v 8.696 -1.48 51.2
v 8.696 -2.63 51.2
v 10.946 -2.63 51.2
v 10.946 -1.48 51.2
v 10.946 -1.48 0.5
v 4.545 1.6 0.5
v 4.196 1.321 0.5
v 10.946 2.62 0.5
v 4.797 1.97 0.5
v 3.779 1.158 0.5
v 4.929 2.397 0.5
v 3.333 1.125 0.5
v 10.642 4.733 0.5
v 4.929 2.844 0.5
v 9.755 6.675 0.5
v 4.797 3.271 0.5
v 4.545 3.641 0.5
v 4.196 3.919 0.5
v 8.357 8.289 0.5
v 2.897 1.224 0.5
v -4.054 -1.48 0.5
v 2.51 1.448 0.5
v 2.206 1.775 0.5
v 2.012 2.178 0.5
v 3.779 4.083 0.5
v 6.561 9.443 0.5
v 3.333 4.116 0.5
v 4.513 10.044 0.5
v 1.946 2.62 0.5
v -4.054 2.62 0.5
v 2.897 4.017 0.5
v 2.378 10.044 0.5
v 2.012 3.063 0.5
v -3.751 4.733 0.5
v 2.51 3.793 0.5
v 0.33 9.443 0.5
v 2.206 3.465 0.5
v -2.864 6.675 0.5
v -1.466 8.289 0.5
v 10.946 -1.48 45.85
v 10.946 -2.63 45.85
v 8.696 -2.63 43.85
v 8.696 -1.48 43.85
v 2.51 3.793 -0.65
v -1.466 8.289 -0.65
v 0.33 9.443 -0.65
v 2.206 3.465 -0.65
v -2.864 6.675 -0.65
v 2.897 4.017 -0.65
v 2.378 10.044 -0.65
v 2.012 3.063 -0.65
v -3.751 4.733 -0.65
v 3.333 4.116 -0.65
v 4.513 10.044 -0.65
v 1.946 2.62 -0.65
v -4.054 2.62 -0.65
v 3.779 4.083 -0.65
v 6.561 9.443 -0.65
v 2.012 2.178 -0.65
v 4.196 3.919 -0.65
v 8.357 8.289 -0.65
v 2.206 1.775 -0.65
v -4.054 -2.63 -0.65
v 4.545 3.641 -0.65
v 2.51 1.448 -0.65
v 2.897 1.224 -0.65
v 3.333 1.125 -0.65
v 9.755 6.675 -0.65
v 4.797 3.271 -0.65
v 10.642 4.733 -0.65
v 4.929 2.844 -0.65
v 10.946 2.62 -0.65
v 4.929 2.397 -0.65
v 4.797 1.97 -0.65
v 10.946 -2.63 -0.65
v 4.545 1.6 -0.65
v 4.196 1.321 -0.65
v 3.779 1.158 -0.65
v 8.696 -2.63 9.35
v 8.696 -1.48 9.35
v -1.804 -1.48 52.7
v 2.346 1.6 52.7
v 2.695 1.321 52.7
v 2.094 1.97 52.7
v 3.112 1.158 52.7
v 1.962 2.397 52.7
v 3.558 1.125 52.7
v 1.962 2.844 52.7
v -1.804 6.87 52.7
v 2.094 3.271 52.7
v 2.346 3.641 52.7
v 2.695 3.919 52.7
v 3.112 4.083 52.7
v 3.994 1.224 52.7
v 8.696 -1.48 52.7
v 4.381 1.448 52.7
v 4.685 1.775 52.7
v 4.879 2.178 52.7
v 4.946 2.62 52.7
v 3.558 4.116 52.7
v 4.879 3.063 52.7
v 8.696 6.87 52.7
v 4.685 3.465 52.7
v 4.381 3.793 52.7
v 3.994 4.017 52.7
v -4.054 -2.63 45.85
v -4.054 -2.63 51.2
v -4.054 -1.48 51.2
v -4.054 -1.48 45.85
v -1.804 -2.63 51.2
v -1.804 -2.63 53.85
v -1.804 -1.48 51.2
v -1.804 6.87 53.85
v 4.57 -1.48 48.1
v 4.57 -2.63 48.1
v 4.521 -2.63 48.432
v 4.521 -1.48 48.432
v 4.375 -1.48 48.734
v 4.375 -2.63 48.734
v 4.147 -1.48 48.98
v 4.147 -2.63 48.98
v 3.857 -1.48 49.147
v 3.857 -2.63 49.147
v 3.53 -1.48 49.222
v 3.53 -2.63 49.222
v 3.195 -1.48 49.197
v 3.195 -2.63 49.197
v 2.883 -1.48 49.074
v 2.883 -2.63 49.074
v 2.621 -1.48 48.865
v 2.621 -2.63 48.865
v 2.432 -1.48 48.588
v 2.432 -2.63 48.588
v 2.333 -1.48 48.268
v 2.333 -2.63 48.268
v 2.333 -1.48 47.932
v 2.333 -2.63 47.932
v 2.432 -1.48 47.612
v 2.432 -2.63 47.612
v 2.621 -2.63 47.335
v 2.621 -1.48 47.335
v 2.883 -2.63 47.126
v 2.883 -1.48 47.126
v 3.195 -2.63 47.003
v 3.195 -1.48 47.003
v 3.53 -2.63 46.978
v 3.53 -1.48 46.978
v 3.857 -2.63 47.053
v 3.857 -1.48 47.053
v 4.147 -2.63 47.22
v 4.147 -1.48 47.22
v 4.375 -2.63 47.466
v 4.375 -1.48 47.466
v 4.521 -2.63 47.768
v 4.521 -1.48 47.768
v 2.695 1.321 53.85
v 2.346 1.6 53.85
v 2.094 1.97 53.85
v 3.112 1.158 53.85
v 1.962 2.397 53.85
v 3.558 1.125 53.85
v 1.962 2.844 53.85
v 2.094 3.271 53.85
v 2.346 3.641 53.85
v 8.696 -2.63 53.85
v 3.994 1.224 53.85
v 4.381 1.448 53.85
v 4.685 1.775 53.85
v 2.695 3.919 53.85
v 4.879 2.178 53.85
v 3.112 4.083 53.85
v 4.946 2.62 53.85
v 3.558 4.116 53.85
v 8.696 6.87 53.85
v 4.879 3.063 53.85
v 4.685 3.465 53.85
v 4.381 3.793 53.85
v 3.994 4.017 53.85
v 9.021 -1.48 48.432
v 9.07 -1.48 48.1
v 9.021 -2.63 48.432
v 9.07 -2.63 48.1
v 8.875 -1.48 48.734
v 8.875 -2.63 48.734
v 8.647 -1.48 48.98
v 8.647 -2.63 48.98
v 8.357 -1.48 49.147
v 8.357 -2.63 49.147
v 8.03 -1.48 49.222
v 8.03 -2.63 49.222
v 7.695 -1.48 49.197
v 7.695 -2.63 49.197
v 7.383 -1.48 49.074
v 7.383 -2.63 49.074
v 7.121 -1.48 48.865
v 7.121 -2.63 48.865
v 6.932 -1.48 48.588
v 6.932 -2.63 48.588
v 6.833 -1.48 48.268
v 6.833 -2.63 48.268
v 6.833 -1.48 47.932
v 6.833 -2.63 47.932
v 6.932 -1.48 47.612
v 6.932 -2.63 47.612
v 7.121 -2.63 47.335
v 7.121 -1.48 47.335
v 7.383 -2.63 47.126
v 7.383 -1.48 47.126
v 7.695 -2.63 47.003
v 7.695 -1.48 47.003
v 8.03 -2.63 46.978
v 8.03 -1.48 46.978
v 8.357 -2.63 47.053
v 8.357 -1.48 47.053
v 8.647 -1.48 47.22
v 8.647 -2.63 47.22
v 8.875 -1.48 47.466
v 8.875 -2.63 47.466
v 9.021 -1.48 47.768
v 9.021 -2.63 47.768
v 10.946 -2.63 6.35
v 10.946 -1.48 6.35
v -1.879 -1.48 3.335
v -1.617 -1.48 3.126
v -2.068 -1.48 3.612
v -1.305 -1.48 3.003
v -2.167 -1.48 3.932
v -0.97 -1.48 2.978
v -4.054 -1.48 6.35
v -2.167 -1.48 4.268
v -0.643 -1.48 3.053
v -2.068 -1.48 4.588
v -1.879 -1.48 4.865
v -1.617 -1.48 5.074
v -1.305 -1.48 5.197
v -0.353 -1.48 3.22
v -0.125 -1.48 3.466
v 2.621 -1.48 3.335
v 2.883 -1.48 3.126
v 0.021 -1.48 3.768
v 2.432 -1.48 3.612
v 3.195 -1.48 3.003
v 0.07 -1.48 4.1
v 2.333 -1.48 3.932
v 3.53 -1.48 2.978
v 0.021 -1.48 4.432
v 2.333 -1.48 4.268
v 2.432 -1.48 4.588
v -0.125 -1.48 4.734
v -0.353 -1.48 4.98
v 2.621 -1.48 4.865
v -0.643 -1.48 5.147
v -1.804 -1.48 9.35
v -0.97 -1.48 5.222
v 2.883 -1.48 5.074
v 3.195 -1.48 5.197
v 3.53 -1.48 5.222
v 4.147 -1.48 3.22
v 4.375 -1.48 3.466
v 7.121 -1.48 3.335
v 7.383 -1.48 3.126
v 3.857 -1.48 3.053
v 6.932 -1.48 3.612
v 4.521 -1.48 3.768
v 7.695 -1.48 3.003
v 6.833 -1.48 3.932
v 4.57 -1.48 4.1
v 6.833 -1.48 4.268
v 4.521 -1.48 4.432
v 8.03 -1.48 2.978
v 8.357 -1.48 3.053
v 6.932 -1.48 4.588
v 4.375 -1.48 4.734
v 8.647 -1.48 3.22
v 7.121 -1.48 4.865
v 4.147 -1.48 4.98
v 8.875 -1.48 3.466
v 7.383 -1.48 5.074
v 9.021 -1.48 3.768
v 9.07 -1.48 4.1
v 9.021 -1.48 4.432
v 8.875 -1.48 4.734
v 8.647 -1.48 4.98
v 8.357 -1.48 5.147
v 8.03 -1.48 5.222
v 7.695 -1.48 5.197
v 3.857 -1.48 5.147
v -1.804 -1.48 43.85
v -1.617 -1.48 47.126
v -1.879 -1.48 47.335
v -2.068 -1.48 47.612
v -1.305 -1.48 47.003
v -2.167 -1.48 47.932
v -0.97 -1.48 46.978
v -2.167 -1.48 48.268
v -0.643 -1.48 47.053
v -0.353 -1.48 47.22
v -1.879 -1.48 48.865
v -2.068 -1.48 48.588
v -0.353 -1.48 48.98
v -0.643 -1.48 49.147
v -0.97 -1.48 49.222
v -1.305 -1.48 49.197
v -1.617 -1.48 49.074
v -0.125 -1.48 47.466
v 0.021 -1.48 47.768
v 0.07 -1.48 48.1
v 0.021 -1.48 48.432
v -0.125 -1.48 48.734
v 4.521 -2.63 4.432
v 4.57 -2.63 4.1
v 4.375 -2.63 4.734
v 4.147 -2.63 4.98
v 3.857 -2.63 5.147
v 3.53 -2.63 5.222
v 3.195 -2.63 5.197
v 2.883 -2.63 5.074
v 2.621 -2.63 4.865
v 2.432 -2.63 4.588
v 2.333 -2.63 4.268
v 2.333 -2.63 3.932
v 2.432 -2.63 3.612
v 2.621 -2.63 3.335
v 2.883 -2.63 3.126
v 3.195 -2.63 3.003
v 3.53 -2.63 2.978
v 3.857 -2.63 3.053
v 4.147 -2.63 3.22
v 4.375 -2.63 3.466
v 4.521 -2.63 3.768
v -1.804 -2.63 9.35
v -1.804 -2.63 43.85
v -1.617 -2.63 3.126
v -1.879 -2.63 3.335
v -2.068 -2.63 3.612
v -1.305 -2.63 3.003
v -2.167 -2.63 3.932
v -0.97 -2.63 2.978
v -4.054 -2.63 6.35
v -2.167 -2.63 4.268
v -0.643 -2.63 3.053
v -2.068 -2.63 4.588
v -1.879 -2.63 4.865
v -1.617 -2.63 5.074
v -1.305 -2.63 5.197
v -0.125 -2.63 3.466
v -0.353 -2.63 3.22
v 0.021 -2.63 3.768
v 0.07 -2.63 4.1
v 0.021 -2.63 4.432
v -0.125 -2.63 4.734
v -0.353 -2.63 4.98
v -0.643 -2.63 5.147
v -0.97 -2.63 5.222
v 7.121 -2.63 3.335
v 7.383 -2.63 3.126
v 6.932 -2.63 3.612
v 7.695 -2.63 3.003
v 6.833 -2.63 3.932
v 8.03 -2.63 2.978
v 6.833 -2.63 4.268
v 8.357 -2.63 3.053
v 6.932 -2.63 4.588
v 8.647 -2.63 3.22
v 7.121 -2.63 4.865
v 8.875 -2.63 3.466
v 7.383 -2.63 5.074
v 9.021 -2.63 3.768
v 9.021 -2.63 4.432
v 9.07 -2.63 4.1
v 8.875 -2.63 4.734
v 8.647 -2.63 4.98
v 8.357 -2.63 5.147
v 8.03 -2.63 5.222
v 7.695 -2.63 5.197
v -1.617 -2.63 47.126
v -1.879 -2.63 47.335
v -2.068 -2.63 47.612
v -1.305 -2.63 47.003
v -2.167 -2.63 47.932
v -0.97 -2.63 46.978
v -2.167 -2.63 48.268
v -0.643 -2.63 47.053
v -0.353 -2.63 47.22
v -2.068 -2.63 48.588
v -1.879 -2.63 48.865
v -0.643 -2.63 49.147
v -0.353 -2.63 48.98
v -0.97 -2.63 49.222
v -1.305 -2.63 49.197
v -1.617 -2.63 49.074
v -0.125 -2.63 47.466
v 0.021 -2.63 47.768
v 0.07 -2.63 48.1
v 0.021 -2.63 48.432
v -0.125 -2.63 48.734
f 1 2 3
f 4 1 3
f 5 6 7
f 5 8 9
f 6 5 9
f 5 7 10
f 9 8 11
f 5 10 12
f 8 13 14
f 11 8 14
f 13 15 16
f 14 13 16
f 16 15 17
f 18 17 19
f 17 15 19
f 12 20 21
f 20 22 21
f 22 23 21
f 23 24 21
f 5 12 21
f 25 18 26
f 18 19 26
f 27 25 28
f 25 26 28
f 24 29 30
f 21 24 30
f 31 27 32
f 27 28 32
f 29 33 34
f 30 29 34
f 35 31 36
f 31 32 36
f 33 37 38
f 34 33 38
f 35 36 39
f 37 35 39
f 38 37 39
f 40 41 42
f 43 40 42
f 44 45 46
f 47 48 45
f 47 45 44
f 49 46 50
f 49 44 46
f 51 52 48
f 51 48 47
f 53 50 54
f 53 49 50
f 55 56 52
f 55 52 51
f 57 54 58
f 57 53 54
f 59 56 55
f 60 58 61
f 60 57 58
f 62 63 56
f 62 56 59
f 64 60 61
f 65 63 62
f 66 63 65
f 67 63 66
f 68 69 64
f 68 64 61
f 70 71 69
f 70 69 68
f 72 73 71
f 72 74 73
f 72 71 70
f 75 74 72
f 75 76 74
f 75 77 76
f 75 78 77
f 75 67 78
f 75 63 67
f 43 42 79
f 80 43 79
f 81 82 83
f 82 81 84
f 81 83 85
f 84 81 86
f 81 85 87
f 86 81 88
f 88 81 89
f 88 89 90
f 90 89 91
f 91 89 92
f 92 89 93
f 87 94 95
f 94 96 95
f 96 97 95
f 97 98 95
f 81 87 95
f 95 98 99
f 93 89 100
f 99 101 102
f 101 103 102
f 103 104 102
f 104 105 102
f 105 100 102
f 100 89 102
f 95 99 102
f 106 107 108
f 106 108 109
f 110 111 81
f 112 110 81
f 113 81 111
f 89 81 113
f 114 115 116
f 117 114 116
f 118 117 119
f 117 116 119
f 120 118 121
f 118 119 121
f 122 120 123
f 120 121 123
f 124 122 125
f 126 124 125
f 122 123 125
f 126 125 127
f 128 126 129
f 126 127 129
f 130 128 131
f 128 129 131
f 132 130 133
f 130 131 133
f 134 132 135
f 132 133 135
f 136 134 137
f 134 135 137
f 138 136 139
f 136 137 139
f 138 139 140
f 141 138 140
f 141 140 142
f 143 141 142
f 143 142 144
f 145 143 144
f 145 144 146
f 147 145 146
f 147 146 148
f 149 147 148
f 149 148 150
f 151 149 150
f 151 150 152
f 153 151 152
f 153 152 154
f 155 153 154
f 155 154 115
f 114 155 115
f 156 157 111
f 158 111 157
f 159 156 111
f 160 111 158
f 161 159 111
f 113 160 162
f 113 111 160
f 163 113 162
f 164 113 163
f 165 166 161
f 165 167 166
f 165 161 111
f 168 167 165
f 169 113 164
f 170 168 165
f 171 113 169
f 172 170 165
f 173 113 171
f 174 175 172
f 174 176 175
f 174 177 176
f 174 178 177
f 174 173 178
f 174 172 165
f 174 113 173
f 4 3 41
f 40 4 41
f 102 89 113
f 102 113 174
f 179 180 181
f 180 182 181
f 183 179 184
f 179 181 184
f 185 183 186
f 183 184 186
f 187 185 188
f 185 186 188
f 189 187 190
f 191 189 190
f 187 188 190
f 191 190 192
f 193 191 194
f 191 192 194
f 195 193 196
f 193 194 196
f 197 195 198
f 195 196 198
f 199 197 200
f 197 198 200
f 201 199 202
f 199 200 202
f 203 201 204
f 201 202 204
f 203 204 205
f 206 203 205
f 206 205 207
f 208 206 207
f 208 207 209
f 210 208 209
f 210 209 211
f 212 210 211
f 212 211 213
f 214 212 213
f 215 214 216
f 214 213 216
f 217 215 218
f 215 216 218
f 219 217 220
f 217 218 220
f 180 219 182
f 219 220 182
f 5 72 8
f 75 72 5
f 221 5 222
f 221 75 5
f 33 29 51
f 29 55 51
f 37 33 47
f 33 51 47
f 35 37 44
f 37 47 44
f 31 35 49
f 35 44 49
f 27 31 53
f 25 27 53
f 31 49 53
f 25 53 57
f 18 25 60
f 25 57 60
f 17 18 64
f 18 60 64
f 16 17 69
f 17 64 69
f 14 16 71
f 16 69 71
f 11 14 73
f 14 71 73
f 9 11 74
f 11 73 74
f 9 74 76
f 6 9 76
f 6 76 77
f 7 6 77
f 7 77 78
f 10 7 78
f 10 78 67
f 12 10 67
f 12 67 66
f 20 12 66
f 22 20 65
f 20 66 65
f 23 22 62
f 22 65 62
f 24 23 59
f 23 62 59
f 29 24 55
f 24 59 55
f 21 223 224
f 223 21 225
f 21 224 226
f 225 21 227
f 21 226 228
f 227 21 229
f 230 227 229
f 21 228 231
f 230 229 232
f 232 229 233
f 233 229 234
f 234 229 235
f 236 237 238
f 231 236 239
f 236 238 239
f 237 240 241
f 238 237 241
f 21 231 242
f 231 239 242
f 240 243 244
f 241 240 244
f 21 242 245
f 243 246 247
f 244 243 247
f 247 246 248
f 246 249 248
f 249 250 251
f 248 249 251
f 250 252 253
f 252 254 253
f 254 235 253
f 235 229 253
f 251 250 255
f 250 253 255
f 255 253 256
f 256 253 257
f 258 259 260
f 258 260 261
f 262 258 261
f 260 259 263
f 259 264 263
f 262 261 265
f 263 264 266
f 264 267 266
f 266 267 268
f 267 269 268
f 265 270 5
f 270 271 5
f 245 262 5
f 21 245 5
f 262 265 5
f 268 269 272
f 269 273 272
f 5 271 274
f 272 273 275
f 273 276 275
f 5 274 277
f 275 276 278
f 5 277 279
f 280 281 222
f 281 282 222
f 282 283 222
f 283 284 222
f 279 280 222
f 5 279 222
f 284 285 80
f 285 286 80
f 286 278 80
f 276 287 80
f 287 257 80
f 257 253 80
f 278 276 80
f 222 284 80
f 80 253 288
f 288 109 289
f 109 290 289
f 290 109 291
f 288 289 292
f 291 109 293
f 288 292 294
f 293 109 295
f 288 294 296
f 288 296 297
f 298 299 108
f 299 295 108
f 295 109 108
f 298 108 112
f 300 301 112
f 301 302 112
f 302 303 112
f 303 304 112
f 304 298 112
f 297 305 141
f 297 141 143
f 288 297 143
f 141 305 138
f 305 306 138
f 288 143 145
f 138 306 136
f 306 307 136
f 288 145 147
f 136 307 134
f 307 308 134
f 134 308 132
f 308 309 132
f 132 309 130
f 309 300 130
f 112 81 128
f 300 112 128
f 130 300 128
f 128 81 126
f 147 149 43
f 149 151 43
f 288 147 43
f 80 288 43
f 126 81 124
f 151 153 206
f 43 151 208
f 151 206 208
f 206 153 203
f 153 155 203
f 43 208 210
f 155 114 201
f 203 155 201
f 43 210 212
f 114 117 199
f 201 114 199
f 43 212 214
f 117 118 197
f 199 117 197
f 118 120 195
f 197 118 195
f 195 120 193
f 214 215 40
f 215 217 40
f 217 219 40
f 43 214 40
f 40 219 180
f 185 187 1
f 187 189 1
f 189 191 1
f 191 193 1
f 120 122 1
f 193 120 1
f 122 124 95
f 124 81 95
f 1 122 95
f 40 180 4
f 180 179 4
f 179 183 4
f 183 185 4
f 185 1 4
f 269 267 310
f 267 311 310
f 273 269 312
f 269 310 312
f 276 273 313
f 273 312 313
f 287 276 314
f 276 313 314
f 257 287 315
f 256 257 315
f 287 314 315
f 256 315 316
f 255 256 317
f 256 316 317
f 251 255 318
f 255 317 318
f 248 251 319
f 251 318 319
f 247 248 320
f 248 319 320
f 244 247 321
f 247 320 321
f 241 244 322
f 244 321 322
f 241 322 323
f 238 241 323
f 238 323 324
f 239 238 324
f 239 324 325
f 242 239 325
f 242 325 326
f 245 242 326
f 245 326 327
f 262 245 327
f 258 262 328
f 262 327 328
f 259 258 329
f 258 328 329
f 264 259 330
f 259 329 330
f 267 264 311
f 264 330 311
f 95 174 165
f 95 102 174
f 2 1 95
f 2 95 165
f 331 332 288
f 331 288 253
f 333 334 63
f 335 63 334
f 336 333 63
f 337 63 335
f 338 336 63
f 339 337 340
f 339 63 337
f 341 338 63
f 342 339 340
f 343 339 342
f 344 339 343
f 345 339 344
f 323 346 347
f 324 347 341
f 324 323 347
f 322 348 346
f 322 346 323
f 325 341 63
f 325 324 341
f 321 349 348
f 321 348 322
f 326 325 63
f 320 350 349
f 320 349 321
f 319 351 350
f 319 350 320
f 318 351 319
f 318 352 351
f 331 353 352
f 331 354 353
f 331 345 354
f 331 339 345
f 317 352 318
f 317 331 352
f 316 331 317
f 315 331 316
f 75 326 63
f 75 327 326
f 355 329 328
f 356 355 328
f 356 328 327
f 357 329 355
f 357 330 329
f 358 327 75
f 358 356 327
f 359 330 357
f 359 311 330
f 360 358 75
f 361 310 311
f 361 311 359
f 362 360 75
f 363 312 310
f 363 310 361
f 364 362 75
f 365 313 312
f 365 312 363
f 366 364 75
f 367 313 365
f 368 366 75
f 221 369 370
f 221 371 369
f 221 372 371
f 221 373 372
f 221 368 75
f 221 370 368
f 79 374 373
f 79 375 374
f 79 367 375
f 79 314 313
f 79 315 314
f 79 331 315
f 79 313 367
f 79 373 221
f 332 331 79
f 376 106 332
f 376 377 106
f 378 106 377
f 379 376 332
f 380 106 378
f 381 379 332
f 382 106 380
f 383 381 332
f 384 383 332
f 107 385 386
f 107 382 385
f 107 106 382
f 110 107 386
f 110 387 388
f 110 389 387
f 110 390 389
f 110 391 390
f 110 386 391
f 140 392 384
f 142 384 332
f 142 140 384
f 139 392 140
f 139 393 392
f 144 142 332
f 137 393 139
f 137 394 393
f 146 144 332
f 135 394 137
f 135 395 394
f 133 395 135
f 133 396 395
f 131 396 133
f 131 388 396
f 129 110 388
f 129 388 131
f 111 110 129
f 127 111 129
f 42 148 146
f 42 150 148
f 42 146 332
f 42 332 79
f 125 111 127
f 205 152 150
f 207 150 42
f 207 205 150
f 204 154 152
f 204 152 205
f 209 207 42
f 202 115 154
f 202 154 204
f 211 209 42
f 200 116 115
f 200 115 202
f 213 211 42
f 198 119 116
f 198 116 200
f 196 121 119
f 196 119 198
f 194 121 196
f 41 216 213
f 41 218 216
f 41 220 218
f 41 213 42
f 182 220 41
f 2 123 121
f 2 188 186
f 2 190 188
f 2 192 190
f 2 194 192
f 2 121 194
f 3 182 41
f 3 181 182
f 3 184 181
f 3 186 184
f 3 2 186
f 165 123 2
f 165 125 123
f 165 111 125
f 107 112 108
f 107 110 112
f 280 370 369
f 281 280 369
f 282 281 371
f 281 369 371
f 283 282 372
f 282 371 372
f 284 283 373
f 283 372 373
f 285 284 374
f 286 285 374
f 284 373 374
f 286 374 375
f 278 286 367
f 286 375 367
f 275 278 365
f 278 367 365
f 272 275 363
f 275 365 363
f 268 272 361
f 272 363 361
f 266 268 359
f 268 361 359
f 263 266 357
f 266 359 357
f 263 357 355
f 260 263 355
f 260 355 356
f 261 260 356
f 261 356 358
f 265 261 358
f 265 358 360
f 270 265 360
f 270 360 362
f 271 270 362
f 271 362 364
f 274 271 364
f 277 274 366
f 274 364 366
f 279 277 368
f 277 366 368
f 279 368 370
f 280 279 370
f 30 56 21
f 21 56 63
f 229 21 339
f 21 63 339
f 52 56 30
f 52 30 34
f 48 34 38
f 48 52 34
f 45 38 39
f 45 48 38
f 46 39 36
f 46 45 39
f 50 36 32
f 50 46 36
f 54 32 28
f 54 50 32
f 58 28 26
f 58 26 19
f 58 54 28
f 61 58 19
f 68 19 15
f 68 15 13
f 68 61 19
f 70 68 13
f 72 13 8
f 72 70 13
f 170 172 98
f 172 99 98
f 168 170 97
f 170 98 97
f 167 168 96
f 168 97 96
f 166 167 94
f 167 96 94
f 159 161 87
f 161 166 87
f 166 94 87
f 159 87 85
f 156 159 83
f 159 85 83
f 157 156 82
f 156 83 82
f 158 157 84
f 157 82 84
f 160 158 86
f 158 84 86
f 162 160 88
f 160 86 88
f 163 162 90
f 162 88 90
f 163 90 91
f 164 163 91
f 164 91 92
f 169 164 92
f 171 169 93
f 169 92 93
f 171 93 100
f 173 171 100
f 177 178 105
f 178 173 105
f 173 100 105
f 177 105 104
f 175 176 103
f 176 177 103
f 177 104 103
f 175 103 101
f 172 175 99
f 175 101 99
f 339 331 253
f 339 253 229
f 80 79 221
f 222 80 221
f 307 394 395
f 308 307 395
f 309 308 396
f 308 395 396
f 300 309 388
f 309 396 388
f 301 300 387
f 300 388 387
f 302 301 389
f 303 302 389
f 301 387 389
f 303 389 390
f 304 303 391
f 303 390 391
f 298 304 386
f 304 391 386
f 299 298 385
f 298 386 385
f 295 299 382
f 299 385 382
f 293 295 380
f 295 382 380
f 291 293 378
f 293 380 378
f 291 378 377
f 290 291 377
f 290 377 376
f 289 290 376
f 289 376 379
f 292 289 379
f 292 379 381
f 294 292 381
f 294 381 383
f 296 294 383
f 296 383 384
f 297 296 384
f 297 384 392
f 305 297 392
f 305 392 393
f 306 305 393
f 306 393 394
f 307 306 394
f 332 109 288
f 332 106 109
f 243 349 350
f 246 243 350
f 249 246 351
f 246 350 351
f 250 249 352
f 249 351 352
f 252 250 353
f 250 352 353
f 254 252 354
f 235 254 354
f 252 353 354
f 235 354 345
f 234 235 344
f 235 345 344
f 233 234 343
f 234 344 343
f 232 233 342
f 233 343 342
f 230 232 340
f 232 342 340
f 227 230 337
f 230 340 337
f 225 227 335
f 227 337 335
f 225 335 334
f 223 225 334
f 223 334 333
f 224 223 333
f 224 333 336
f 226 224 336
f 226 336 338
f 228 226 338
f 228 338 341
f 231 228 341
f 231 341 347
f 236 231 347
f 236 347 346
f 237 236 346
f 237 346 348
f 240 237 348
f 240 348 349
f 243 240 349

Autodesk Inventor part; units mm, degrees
ref_plane "YZ Plane" through (0, 0, 0) normal (1, 0, 0) x (0, 1, 0)
ref_plane "XZ Plane" through (0, 0, 0) normal (0, 1, 0) x (-1, 0, 0)
ref_plane "XY Plane" through (0, 0, 0) normal (0, 0, 1) x (1, 0, 0)
ref_plane "Work Plane1" through (3.4455, 2.6204, 52.7) normal (0, 0, 1) x (1, 0, 0)
sketch "Sketch1" plane through (3.4455, 2.6204, 52.7) normal (0, 0, 1) x (1, 0, 0)
  circle A0 centre (0, 0) radius 1.5 projected
  line L0 (-5.25, 4.25) -> (5.25, 4.25)
  line L1 (5.25, 4.25) -> (5.25, -5.25)
  line L2 (5.25, -5.25) -> (-5.25, -5.25)
  line L3 (-5.25, -5.25) -> (-5.25, 4.25)
  point P0 (-3.4455, -2.6204)
  dimension "d2" = 10.5
  dimension "d4" = 4.25
  dimension "d6" = 5.25
  dimension "d7" = 9.5
extrude "Extrusion1" add sketch "Sketch1" along normal blind 1.15
sketch "Sketch2" plane through (3.4455, 2.6204, 52.7) normal (0, 0, -1) x (-1, 0, 0)
  line L0 (-5.25, 4.25) -> (-5.25, -5.25) projected
  line L1 (-5.25, -5.25) -> (5.25, -5.25) projected
  line L2 (5.25, -5.25) -> (5.25, 4.25) projected
  line L3 (-5.25, -5.25) -> (-5.25, -4.1)
  line L4 (-5.25, -4.1) -> (5.25, -4.1)
  point P0 (3.4455, -2.6204)
  dimension "d10" = 1.15
extrude "Extrusion2" add sketch "Sketch2" along normal blind 1.5
sketch "Sketch3" plane through (-1.8045, -2.6296, 53.85) normal (0, -1, 0) x (1, 0, 0)
  line L0 (0, 0) -> (10.5, 0) projected
  line L1 (10.5, -2.65) -> (0, -2.65) projected
  line L2 (5.25, -54.5) -> (12.75, -54.5)
  line L3 (5.25, 0) -> (5.25, -54.5) construction
  line L4 (12.75, -54.5) -> (12.75, -47.5)
  line L5 (10.5, -10) -> (10.5, -44.5)
  line L6 (12.75, -2.65) -> (12.75, -8)
  line L7 (5.25, -2.65) -> (12.75, -2.65)
  line L8 (12.75, -8) -> (10.5, -10)
  line L9 (10.5, -44.5) -> (12.75, -47.5)
  line L10 (5.25, -54.5) -> (-2.25, -54.5)
  line L11 (-2.25, -54.5) -> (-2.25, -47.5)
  line L12 (0, -10) -> (0, -44.5)
  line L13 (-2.25, -2.65) -> (-2.25, -8)
  line L14 (5.25, -2.65) -> (-2.25, -2.65)
  line L15 (-2.25, -8) -> (0, -10)
  line L16 (0, -44.5) -> (-2.25, -47.5)
  circle A0 centre (5.25, -5.75) radius 1.125
  circle A1 centre (0.75, -5.75) radius 1.125
  circle A2 centre (9.75, -5.75) radius 1.125
  circle A3 centre (0.75, -49.75) radius 1.125
  circle A4 centre (9.75, -49.75) radius 1.125
  circle A5 centre (5.25, -49.75) radius 1.125
  dimension "d13" = 54.5
  dimension "d15" = 7.5
  dimension "d16" = 7
  dimension "d17" = 10
  dimension "d18" = 34.5
  dimension "d19" = 5.25
  dimension "d20" = 8
  dimension "d21" = 7.5
  dimension "d24" = 2.25
  dimension "d25" = 5.75
  dimension "d26" = 2.25
  dimension "d27" = 4.5
  dimension "d28" = 2.25
  dimension "d29" = 4.5
  dimension "d30" = 4.75
  dimension "d32" = 5.75
  dimension "d33" = 4.5
  dimension "d34" = 2.25
  dimension "d35" = 2.25
  dimension "d36" = 2.25
extrude "Extrusion3" add sketch "Sketch3" against normal blind 1.15
sketch "Sketch4" plane through (10.9455, -2.6296, -0.65) normal (0, 0, -1) x (-1, 0, 0)
  line L0 (2.25, 1.15) -> (12.75, 1.15) projected
  line L1 (12.75, 1.15) -> (12.75, 9.5) projected
  line L2 (12.75, 9.5) -> (2.25, 9.5) projected
  line L3 (2.25, 9.5) -> (2.25, 1.15) projected
  circle A0 centre (7.5, 5.25) radius 1.5 projected
  line L4 (0, 1.15) -> (0, 5.25)
  line L5 (15, 1.15) -> (15, 5.25)
  line L6 (0, 1.15) -> (15, 1.15)
  circle A1 centre (7.5, 5.25) radius 1.5
  arc A2 (1.2199, 1.15) -> (13.7801, 1.15) centre (7.5, 5.25) ccw
  arc A3 (15, 5.25) -> (0, 5.25) centre (7.5, 5.25) ccw
  point P0 (10.9455, 2.6296)
extrude "Extrusion4" add sketch "Sketch4" against normal blind 1.15 contours L3 L2 L1 L0 | L6 L4 A3 L5 L1 L2 L3
